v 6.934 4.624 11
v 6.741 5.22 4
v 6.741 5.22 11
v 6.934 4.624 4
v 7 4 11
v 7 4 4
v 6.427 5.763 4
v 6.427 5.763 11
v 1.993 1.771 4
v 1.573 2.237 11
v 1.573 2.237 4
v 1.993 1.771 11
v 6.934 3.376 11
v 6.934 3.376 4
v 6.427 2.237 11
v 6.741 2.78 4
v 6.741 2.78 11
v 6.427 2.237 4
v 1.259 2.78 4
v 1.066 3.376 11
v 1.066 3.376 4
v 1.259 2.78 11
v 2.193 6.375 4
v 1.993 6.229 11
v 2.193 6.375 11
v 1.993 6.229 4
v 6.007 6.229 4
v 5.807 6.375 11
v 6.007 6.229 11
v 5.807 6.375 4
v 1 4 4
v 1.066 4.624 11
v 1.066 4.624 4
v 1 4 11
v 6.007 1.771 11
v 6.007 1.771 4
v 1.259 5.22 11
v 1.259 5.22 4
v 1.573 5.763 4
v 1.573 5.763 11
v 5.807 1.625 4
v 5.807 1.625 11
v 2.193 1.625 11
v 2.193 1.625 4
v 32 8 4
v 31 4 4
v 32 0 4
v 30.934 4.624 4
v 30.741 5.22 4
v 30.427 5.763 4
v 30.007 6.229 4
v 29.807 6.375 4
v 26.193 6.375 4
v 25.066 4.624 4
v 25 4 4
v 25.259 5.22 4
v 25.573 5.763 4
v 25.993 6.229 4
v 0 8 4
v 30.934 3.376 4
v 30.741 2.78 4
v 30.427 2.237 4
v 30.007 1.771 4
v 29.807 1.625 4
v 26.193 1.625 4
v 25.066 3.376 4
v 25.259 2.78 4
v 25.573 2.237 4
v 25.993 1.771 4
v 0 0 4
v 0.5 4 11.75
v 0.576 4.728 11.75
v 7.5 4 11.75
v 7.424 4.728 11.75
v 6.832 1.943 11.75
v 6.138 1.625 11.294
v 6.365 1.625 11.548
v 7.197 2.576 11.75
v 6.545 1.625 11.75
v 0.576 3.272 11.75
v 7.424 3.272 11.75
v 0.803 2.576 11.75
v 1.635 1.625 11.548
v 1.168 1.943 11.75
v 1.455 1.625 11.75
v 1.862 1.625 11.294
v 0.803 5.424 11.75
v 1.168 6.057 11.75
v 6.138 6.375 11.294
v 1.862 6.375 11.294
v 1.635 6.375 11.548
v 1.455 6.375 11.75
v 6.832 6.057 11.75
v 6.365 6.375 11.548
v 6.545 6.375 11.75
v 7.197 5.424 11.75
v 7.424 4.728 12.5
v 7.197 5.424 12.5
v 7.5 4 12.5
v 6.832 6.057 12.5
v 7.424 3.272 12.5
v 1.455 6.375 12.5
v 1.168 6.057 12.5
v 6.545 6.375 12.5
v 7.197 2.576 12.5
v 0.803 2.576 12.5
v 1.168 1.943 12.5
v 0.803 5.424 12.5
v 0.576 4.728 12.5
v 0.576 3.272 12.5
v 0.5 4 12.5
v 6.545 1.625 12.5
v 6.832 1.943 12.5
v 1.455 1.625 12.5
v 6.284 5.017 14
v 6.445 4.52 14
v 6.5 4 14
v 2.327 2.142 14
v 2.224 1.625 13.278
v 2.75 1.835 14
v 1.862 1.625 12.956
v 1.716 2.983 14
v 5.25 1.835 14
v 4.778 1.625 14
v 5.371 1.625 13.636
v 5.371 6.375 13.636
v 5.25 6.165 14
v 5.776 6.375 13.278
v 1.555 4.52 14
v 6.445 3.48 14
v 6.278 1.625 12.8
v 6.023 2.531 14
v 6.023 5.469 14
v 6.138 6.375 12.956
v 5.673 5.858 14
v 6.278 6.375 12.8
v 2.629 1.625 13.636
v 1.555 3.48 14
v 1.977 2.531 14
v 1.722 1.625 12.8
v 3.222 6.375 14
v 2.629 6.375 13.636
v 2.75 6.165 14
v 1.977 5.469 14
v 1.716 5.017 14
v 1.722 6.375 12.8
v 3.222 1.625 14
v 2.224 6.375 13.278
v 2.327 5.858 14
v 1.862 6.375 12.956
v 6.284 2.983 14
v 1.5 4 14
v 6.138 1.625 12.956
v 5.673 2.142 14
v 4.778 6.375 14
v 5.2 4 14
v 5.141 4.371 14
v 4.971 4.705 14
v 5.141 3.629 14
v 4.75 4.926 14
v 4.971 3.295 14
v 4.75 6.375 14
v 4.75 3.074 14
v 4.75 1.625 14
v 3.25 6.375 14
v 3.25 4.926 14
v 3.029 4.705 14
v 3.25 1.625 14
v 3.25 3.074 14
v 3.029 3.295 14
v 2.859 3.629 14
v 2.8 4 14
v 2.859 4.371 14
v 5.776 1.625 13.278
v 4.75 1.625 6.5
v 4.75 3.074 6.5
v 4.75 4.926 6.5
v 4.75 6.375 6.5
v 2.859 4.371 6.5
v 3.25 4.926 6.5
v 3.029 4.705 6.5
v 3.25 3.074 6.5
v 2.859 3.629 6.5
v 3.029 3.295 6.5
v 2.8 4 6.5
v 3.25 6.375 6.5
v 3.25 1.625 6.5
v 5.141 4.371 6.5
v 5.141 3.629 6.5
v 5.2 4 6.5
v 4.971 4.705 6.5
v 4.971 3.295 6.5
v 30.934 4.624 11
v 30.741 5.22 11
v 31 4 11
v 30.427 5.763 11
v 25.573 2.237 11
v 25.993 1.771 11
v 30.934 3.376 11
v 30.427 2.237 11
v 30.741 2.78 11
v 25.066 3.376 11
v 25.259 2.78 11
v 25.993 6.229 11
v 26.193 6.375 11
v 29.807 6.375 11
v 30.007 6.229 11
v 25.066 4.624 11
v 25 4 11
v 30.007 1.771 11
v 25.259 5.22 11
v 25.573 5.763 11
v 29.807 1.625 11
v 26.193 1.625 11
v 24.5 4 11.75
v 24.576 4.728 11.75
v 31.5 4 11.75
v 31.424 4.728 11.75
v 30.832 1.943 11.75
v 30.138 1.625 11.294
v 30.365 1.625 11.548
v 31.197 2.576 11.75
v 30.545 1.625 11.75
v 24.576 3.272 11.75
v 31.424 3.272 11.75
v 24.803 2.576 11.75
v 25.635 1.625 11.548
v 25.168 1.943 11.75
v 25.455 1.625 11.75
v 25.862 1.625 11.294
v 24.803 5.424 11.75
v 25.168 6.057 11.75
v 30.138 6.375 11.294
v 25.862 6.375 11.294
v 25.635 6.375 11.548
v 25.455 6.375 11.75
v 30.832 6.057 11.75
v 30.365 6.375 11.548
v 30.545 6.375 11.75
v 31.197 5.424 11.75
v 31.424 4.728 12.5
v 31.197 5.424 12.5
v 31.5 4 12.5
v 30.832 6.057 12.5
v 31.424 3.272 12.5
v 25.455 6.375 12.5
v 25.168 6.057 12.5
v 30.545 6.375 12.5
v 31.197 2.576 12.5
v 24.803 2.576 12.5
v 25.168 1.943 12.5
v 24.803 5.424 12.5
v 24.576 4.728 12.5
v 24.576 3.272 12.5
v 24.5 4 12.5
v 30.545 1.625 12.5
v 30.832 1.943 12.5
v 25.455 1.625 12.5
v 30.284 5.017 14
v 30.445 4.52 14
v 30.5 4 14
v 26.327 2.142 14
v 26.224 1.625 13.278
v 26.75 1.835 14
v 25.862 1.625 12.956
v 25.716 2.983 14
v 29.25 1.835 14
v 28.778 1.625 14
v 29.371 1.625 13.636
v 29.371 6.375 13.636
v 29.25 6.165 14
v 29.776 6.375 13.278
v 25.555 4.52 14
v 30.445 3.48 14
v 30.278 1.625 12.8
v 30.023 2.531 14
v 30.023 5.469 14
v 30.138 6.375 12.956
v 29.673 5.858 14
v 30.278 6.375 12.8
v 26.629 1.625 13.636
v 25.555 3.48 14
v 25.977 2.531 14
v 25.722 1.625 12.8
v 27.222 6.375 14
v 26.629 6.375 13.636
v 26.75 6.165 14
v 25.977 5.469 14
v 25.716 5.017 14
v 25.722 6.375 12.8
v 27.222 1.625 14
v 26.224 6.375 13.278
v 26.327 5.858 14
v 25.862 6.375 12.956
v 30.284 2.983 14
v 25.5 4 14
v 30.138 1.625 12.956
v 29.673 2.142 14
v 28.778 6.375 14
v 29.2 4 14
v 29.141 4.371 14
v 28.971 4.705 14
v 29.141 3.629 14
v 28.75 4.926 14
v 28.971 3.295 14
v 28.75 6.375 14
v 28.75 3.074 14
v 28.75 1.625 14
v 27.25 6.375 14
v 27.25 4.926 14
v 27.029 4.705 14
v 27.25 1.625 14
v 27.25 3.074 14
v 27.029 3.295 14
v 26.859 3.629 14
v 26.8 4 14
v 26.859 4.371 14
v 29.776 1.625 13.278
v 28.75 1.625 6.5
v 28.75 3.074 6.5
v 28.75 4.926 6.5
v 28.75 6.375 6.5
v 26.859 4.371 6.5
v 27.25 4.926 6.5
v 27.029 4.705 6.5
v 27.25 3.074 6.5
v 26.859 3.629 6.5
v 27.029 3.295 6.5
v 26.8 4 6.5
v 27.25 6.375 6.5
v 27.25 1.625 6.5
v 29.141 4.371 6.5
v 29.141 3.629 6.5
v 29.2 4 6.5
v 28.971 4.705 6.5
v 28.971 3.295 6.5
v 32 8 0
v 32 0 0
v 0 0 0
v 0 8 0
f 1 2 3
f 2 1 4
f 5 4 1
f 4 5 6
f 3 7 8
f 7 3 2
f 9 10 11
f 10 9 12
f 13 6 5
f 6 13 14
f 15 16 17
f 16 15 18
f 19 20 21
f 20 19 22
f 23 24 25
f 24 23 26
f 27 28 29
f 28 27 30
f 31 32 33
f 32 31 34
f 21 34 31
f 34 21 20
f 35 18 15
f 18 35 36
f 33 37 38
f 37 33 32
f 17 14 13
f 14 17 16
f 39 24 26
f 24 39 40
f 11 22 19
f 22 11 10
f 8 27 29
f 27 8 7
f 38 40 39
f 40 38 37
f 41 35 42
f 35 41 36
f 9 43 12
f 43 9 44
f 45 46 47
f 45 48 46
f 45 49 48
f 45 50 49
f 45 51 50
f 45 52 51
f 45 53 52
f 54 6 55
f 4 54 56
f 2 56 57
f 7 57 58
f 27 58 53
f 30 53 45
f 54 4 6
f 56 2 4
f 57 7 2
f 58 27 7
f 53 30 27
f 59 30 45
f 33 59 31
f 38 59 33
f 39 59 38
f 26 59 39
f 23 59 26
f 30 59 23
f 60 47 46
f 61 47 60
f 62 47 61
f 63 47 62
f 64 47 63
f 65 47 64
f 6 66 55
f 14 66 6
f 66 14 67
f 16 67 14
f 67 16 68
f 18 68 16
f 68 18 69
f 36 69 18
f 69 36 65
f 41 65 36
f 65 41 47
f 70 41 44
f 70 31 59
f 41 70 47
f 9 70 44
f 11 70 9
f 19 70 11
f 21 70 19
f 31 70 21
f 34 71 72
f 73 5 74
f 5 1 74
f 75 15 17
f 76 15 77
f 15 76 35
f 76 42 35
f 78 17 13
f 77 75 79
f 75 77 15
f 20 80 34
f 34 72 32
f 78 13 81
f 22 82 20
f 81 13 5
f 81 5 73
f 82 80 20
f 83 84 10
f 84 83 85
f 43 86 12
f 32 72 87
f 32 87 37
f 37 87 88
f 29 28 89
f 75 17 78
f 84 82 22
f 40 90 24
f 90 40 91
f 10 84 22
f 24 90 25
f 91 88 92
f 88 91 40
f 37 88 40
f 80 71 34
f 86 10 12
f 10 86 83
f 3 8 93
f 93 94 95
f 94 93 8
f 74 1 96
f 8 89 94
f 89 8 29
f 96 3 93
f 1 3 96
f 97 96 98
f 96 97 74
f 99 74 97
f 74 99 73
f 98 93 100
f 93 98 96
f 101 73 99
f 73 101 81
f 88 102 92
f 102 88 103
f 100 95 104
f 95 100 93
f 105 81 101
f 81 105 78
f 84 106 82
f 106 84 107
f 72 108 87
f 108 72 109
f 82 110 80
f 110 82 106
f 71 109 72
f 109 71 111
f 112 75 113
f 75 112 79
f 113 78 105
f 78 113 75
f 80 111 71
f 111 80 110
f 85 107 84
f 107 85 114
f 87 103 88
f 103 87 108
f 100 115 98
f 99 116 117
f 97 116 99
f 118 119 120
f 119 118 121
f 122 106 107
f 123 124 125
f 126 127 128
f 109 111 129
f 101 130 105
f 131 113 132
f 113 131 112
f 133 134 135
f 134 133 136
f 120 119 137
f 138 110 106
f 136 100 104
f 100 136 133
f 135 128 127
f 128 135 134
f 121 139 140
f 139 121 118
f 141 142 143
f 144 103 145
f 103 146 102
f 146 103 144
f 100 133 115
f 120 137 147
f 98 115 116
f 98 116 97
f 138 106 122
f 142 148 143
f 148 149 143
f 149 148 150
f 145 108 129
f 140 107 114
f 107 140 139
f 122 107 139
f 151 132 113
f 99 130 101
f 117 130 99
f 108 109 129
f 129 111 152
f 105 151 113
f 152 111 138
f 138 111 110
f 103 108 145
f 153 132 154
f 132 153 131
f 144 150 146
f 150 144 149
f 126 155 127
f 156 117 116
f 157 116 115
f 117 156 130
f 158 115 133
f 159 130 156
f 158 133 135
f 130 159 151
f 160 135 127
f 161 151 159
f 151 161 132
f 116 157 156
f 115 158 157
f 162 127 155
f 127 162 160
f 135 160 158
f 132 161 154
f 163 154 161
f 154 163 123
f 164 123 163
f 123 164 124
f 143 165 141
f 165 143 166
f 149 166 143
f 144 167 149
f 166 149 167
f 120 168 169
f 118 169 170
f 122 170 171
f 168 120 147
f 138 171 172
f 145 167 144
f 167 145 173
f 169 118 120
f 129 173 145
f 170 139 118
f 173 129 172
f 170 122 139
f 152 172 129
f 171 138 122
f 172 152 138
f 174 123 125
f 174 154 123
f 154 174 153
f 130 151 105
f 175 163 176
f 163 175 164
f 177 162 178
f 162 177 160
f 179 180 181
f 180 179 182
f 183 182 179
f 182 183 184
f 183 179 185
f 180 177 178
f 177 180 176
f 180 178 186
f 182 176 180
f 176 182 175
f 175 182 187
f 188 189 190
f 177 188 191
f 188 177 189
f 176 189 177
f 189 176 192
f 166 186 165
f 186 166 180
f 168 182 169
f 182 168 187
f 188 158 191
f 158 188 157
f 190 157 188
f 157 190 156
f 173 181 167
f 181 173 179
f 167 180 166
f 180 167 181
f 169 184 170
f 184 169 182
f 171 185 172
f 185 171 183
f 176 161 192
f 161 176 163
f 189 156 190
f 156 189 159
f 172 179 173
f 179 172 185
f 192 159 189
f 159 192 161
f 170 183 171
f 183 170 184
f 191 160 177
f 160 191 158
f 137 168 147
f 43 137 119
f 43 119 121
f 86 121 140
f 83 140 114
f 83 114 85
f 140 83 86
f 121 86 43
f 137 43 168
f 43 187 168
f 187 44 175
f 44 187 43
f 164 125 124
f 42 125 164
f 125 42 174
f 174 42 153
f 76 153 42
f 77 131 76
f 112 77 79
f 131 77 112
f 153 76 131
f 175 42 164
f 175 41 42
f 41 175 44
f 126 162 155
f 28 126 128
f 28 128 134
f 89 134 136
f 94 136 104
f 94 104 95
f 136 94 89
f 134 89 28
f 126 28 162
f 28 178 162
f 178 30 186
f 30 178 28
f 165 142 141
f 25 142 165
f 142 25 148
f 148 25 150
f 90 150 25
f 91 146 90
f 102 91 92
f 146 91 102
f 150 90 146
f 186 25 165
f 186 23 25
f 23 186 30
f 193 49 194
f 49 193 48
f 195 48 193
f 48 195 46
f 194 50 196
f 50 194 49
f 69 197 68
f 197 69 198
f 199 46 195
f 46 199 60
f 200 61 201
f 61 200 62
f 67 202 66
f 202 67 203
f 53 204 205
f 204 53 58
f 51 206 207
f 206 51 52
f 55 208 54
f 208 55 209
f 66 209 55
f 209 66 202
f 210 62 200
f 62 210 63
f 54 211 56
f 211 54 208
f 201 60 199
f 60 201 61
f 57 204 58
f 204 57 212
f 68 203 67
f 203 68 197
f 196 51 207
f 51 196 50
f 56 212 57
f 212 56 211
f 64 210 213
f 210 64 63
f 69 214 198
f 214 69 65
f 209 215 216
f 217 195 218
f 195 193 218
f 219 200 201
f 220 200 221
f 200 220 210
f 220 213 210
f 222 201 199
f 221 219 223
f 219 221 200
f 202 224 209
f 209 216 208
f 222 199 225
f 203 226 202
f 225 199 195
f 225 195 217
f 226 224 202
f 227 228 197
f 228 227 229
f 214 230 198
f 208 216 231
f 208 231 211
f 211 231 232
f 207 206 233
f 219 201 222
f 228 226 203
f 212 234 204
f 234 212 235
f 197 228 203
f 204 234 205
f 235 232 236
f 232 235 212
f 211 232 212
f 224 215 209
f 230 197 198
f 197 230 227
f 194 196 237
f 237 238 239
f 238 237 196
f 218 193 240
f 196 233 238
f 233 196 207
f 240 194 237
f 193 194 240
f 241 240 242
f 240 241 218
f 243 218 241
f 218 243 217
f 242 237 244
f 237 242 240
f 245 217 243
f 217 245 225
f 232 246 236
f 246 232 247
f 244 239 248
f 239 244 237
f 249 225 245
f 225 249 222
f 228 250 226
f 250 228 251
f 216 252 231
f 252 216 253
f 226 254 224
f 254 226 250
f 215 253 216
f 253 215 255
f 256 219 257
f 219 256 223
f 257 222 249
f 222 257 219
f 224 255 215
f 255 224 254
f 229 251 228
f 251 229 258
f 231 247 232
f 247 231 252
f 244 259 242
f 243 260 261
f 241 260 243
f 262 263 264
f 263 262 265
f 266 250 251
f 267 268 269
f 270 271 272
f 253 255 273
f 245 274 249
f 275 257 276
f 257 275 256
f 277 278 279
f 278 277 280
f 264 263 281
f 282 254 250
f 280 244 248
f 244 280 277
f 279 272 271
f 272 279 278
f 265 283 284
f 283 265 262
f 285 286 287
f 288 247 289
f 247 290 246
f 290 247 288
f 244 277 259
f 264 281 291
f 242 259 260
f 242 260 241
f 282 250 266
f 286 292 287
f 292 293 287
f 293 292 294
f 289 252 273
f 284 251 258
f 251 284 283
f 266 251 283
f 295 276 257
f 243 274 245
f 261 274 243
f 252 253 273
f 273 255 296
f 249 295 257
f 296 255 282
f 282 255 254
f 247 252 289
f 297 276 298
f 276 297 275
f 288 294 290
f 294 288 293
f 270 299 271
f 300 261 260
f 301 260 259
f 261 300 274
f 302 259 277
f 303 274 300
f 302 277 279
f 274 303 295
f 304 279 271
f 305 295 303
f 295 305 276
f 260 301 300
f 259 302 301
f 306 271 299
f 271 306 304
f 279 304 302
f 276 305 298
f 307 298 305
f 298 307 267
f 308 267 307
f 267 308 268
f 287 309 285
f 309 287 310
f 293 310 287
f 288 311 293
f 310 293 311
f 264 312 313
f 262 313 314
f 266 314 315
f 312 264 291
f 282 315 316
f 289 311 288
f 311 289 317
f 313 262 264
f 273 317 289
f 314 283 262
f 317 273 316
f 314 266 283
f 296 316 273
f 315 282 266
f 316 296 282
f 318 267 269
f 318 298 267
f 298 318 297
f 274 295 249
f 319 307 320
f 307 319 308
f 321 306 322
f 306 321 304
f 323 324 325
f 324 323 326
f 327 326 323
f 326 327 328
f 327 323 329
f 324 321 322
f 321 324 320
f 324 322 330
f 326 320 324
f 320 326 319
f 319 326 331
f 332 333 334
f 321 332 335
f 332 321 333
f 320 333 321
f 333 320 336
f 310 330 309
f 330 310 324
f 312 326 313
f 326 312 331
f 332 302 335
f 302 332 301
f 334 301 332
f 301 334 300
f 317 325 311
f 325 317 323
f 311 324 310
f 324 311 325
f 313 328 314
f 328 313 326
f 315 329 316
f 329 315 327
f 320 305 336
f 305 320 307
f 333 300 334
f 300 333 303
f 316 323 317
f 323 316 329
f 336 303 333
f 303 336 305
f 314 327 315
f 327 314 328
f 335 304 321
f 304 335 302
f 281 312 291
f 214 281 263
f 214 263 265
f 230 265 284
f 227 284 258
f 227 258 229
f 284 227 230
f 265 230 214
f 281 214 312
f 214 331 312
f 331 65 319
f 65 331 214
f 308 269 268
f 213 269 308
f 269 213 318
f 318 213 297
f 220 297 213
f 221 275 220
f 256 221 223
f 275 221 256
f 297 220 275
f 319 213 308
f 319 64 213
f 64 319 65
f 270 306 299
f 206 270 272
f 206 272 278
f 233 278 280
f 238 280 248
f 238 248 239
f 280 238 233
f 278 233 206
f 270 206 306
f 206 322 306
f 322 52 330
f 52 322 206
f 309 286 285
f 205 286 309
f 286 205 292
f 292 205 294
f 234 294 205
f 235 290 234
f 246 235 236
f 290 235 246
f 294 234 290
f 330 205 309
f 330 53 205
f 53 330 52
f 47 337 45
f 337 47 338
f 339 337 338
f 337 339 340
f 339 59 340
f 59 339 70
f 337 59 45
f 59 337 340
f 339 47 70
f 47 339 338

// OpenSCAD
// Pin Connectors V2
// Tony Buser <tbuser@gmail.com>
// From http://www.thingiverse.com/thing:10541

// pinhole(h=5);

tolerance=0.3;

translate([4, 4, 4]) pin(r=3, h=10, t=tolerance, tight=false);
translate([28, 4, 4]) pin(r=3, h=10, t=tolerance, tight=false);
cube([32, 8, 4]);

// test();
// pintack(h=10);
// pinpeg(h=20);

module test() {
  tolerance = 0.3;
  
  translate([-12, 12, 0]) pinpeg(h=20);
  translate([12, 12, 0]) pintack(h=10);
  
  difference() {
    union() {
      translate([0, -12, 2.5]) cube(size = [59, 20, 5], center = true);
      translate([24, -12, 7.5]) cube(size = [12, 20, 15], center = true);
    }
    translate([-24, -12, 0]) pinhole(h=5, t=tolerance);
    translate([-12, -12, 0]) pinhole(h=5, t=tolerance, tight=false);
    translate([0, -12, 0]) pinhole(h=10, t=tolerance);
    translate([12, -12, 0]) pinhole(h=10, t=tolerance, tight=false);
    translate([24, -12, 15]) rotate([0, 180, 0]) pinhole(h=10, t=tolerance);
  }
}

module pinhole(h=10, r=4, lh=3, lt=1, t=0.3, tight=true) {
  // h = shaft height
  // r = shaft radius
  // lh = lip height
  // lt = lip thickness
  // t = tolerance
  // tight = set to false if you want a joint that spins easily
  
  union() {
    pin_solid(h, r+(t/2), lh, lt);
    cylinder(h=h+0.2, r=r);
    // widen the cylinder slightly
    // cylinder(h=h+0.2, r=r+(t-0.2/2));
    if (tight == false) {
      cylinder(h=h+0.2, r=r+(t/2)+0.25);
    }
    // widen the entrance hole to make insertion easier
    translate([0, 0, -0.1]) cylinder(h=lh/3, r2=r, r1=r+(t/2)+(lt/2));
  }
}

module pin(h=10, r=4, lh=3, lt=1, side=false) {
  // h = shaft height
  // r = shaft radius
  // lh = lip height
  // lt = lip thickness
  // side = set to true if you want it printed horizontally

  if (side) {
    pin_horizontal(h, r, lh, lt);
  } else {
    pin_vertical(h, r, lh, lt);
  }
}

module pintack(h=10, r=4, lh=3, lt=1, bh=3, br=8.75) {
  // bh = base_height
  // br = base_radius
  
  union() {
    cylinder(h=bh, r=br);
    translate([0, 0, bh]) pin(h, r, lh, lt);
  }
}

module pinpeg(h=20, r=4, lh=3, lt=1) {
  union() {
    translate([0, -h/4+0.05, 0]) pin(h/2+0.1, r, lh, lt, side=true);
    translate([0, h/4-0.05, 0]) rotate([0, 0, 180]) pin(h/2+0.1, r, lh, lt, side=true);
  }
}

// just call pin instead, I made this module because it was easier to do the rotation option this way
// since openscad complains of recursion if I did it all in one module
module pin_vertical(h=10, r=4, lh=3, lt=1) {
  // h = shaft height
  // r = shaft radius
  // lh = lip height
  // lt = lip thickness

  difference() {
    pin_solid(h, r, lh, lt);
    
    // center cut
    translate([-r*0.5/2, -(r*2+lt*2)/2, h/4]) cube([r*0.5, r*2+lt*2, h]);
    translate([0, 0, h/4]) cylinder(h=h+lh, r=r/2.5, $fn=20);
    // center curve
    // translate([0, 0, h/4]) rotate([90, 0, 0]) cylinder(h=r*2, r=r*0.5/2, center=true, $fn=20);
  
    // side cuts
    translate([-r*2, -lt-r*1.125, -1]) cube([r*4, lt*2, h+2]);
    translate([-r*2, -lt+r*1.125, -1]) cube([r*4, lt*2, h+2]);
  }
}

// call pin with side=true instead of this
module pin_horizontal(h=10, r=4, lh=3, lt=1) {
  // h = shaft height
  // r = shaft radius
  // lh = lip height
  // lt = lip thickness
  translate([0, h/2, r*1.125-lt]) rotate([90, 0, 0]) pin_vertical(h, r, lh, lt);
}

// this is mainly to make the pinhole module easier
module pin_solid(h=10, r=4, lh=3, lt=1) {
  union() {
    // shaft
    cylinder(h=h-lh, r=r, $fn=30);
    // lip
    // translate([0, 0, h-lh]) cylinder(h=lh*0.25, r1=r, r2=r+(lt/2), $fn=30);
    // translate([0, 0, h-lh+lh*0.25]) cylinder(h=lh*0.25, r2=r, r1=r+(lt/2), $fn=30);
    // translate([0, 0, h-lh+lh*0.50]) cylinder(h=lh*0.50, r1=r, r2=r-(lt/2), $fn=30);

    // translate([0, 0, h-lh]) cylinder(h=lh*0.50, r1=r, r2=r+(lt/2), $fn=30);
    // translate([0, 0, h-lh+lh*0.50]) cylinder(h=lh*0.50, r1=r+(lt/2), r2=r-(lt/3), $fn=30);    

    translate([0, 0, h-lh]) cylinder(h=lh*0.25, r1=r, r2=r+(lt/2), $fn=30);
    translate([0, 0, h-lh+lh*0.25]) cylinder(h=lh*0.25, r=r+(lt/2), $fn=30);    
    translate([0, 0, h-lh+lh*0.50]) cylinder(h=lh*0.50, r1=r+(lt/2), r2=r-(lt/2), $fn=30);    

    // translate([0, 0, h-lh]) cylinder(h=lh, r1=r+(lt/2), r2=1, $fn=30);
    // translate([0, 0, h-lh-lt/2]) cylinder(h=lt/2, r1=r, r2=r+(lt/2), $fn=30);
  }
}
